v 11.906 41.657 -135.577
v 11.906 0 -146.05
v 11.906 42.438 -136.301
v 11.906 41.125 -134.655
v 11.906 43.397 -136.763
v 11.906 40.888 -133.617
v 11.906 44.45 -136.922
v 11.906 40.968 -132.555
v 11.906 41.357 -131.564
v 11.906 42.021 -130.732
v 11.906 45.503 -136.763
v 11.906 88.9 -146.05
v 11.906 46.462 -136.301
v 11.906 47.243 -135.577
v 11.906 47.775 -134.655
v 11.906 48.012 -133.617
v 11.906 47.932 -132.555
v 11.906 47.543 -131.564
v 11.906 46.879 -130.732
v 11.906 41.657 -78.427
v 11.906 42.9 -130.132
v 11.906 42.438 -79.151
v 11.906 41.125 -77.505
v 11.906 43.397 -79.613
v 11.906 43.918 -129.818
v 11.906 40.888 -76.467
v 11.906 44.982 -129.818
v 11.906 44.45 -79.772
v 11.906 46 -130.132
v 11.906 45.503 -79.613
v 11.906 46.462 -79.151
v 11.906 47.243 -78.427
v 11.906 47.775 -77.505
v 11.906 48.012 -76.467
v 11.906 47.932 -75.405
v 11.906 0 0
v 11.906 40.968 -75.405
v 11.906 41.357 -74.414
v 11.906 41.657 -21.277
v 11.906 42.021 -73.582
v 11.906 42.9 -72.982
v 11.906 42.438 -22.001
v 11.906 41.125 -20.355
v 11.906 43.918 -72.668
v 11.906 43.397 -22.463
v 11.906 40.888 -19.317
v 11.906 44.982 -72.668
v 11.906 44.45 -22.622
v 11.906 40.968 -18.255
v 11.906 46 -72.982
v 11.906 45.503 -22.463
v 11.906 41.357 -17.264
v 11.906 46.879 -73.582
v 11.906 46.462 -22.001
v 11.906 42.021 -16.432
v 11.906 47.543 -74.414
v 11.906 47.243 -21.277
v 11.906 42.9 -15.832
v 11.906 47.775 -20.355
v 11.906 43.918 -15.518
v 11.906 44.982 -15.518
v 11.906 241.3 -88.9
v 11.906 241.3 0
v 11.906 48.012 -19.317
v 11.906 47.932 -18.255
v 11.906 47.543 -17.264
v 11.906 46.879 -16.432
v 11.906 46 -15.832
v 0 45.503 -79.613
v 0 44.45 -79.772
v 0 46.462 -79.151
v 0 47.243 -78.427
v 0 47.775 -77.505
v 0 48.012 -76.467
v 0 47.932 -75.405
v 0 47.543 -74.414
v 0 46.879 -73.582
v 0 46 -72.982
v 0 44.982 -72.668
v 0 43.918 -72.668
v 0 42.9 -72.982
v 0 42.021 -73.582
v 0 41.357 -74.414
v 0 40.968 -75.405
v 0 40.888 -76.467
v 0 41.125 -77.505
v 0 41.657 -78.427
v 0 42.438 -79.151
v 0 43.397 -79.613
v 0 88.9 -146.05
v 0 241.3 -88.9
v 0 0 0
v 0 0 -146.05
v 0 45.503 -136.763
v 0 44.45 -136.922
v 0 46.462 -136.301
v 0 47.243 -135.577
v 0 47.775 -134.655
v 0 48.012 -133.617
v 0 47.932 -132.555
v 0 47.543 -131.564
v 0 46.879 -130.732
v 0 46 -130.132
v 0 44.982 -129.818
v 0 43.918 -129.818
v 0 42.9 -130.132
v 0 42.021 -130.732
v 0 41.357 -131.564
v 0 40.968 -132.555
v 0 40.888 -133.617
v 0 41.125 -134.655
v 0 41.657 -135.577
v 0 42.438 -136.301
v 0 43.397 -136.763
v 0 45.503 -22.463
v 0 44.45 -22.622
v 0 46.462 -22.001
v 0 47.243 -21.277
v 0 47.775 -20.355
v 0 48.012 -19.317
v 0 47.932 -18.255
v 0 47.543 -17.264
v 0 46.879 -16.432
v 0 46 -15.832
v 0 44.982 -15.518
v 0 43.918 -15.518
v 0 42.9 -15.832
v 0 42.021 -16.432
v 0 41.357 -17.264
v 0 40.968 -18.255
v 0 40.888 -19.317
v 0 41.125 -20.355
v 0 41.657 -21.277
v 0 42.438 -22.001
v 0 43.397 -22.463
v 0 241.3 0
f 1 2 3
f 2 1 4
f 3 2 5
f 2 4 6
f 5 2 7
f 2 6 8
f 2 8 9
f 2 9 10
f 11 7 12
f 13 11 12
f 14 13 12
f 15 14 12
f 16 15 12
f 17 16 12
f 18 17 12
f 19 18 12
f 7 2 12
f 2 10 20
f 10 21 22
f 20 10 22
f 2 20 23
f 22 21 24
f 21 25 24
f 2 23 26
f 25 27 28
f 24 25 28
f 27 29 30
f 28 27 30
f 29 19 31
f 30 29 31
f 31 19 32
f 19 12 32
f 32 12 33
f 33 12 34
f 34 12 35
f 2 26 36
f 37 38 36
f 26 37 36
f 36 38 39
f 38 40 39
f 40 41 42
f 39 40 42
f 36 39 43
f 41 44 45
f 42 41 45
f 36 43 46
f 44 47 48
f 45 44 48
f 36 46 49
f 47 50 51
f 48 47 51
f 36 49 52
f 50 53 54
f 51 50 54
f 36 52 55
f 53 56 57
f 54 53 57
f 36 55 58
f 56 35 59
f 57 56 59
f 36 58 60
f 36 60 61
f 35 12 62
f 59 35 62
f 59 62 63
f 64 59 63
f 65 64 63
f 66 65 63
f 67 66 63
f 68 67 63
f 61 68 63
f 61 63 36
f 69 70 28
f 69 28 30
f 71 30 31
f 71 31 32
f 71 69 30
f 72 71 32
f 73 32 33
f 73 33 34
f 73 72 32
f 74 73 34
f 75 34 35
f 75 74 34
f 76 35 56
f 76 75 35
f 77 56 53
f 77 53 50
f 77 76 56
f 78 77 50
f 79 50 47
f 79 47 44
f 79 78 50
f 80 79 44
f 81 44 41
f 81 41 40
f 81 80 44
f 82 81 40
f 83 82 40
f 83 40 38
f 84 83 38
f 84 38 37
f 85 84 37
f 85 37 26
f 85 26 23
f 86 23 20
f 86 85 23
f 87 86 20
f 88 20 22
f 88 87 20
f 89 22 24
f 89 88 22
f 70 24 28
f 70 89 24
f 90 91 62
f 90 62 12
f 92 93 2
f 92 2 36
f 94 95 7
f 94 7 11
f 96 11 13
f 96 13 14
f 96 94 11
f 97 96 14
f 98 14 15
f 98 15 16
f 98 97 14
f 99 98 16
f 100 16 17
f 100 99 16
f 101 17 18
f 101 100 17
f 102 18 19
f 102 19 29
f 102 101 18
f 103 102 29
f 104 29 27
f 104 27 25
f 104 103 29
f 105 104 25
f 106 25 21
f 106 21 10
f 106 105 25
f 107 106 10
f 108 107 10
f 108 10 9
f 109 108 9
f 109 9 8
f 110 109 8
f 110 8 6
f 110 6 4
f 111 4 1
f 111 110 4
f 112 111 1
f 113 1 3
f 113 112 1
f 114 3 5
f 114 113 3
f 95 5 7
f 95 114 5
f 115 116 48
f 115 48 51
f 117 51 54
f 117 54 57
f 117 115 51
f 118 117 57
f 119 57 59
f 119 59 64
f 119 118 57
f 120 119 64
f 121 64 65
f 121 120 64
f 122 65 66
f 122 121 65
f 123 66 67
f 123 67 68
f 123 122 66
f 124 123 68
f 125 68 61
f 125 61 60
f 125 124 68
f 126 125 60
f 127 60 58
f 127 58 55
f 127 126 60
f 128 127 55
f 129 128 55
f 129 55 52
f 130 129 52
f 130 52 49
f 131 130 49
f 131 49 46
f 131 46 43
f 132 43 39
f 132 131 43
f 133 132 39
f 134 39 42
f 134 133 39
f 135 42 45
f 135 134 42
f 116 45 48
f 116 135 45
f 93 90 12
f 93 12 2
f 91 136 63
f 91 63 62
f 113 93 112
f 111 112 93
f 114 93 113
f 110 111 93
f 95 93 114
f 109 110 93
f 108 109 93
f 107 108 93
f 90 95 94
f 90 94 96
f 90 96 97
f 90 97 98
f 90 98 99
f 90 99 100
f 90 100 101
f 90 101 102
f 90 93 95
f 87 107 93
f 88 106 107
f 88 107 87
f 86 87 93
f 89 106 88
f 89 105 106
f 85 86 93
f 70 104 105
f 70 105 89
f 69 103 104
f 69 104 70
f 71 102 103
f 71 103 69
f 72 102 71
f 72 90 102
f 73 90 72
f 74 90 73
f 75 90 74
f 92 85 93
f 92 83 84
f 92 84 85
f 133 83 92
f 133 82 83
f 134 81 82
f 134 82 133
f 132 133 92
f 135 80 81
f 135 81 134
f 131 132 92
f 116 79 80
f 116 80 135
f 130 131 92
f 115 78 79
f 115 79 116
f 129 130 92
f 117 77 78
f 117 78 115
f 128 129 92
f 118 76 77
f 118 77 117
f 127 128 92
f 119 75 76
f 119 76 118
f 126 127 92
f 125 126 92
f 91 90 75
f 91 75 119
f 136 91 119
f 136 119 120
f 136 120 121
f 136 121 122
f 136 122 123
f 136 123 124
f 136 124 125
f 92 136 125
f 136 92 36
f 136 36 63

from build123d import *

# Parameters (mm, degrees)
SKETCH1_R           = 3.571875
BOSS_EXTRUDE1_DEPTH = 11.90625


with BuildPart() as part:
    # Sketch1 → Boss-Extrude1 (new body)
    with BuildSketch(Plane(origin=(0, 0, 0), x_dir=(0, 0, -1), z_dir=(1, 0, 0))):
        Polygon((0, 0), (0, 241.3), (88.9, 241.3), (146.05, 88.9), (146.05, 0), align=None)
        with Locations((19.05, 44.45)):
            Circle(SKETCH1_R, mode=Mode.SUBTRACT)
        with Locations((76.2, 44.45)):
            Circle(SKETCH1_R, mode=Mode.SUBTRACT)
        with Locations((133.35, 44.45)):
            Circle(SKETCH1_R, mode=Mode.SUBTRACT)
    extrude(amount=BOSS_EXTRUDE1_DEPTH)


solid = part.part
